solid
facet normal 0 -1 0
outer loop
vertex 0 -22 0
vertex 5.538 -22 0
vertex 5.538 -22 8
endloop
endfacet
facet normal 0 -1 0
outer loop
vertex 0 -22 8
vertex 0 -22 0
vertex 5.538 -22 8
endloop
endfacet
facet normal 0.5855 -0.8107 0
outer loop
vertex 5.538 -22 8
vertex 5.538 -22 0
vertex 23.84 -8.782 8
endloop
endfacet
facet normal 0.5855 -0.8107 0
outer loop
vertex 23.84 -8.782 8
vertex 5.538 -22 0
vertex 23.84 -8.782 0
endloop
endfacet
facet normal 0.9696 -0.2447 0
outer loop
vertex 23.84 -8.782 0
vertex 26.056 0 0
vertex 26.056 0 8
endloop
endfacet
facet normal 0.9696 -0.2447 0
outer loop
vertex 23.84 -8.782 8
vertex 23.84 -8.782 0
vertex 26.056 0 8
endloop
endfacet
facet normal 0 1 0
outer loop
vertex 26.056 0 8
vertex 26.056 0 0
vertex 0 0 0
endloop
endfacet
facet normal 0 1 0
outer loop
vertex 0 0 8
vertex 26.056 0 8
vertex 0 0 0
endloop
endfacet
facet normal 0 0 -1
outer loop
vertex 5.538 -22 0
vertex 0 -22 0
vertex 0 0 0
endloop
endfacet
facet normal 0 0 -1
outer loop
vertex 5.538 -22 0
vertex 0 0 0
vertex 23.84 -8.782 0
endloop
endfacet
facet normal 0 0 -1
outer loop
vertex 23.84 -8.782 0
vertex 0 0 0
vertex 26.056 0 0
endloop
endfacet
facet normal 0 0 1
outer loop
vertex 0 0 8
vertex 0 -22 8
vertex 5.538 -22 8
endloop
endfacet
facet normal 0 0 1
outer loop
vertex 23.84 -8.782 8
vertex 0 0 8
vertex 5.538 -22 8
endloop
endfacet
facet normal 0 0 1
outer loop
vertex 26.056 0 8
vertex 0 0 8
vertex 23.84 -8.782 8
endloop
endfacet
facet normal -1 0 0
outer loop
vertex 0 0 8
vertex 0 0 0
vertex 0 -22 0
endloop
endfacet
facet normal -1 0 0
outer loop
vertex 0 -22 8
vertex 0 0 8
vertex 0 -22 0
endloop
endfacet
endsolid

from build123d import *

# Parameters (mm, degrees)
EXTRUDE_1_DEPTH = 8
CHAMFER_1_SIZE  = 4
CHAMFER_1_SIZE2 = 6.831877942
CHAMFER_2_SIZE  = 15
CHAMFER_2_SIZE2 = 9.944050138


with BuildPart() as part:
    # Эскиз1 → Вытянуть1 (new body)
    with BuildSketch(Plane.XY):
        Polygon((0, 0), (0, -26), (36, 0), align=None)
    extrude(amount=EXTRUDE_1_DEPTH)

    # Фаска1
    chamfer_1_edges = [part.edges().sort_by_distance(p)[0] for p in [
        (0, -26, 4),
    ]]
    chamfer_1_side = [part.faces().sort_by_distance(p)[0] for p in [
        (0, -13, 4),
    ]]
    chamfer(chamfer_1_edges, length=CHAMFER_1_SIZE, length2=CHAMFER_1_SIZE2, reference=chamfer_1_side[0])

    # Фаска2
    chamfer_2_edges = [part.edges().sort_by_distance(p)[0] for p in [
        (36, 0, 4),
    ]]
    chamfer_2_side = [part.faces().sort_by_distance(p)[0] for p in [
        (20.769230769, -11, 4),
    ]]
    chamfer(chamfer_2_edges, length=CHAMFER_2_SIZE, length2=CHAMFER_2_SIZE2, reference=chamfer_2_side[0])


solid = part.part
